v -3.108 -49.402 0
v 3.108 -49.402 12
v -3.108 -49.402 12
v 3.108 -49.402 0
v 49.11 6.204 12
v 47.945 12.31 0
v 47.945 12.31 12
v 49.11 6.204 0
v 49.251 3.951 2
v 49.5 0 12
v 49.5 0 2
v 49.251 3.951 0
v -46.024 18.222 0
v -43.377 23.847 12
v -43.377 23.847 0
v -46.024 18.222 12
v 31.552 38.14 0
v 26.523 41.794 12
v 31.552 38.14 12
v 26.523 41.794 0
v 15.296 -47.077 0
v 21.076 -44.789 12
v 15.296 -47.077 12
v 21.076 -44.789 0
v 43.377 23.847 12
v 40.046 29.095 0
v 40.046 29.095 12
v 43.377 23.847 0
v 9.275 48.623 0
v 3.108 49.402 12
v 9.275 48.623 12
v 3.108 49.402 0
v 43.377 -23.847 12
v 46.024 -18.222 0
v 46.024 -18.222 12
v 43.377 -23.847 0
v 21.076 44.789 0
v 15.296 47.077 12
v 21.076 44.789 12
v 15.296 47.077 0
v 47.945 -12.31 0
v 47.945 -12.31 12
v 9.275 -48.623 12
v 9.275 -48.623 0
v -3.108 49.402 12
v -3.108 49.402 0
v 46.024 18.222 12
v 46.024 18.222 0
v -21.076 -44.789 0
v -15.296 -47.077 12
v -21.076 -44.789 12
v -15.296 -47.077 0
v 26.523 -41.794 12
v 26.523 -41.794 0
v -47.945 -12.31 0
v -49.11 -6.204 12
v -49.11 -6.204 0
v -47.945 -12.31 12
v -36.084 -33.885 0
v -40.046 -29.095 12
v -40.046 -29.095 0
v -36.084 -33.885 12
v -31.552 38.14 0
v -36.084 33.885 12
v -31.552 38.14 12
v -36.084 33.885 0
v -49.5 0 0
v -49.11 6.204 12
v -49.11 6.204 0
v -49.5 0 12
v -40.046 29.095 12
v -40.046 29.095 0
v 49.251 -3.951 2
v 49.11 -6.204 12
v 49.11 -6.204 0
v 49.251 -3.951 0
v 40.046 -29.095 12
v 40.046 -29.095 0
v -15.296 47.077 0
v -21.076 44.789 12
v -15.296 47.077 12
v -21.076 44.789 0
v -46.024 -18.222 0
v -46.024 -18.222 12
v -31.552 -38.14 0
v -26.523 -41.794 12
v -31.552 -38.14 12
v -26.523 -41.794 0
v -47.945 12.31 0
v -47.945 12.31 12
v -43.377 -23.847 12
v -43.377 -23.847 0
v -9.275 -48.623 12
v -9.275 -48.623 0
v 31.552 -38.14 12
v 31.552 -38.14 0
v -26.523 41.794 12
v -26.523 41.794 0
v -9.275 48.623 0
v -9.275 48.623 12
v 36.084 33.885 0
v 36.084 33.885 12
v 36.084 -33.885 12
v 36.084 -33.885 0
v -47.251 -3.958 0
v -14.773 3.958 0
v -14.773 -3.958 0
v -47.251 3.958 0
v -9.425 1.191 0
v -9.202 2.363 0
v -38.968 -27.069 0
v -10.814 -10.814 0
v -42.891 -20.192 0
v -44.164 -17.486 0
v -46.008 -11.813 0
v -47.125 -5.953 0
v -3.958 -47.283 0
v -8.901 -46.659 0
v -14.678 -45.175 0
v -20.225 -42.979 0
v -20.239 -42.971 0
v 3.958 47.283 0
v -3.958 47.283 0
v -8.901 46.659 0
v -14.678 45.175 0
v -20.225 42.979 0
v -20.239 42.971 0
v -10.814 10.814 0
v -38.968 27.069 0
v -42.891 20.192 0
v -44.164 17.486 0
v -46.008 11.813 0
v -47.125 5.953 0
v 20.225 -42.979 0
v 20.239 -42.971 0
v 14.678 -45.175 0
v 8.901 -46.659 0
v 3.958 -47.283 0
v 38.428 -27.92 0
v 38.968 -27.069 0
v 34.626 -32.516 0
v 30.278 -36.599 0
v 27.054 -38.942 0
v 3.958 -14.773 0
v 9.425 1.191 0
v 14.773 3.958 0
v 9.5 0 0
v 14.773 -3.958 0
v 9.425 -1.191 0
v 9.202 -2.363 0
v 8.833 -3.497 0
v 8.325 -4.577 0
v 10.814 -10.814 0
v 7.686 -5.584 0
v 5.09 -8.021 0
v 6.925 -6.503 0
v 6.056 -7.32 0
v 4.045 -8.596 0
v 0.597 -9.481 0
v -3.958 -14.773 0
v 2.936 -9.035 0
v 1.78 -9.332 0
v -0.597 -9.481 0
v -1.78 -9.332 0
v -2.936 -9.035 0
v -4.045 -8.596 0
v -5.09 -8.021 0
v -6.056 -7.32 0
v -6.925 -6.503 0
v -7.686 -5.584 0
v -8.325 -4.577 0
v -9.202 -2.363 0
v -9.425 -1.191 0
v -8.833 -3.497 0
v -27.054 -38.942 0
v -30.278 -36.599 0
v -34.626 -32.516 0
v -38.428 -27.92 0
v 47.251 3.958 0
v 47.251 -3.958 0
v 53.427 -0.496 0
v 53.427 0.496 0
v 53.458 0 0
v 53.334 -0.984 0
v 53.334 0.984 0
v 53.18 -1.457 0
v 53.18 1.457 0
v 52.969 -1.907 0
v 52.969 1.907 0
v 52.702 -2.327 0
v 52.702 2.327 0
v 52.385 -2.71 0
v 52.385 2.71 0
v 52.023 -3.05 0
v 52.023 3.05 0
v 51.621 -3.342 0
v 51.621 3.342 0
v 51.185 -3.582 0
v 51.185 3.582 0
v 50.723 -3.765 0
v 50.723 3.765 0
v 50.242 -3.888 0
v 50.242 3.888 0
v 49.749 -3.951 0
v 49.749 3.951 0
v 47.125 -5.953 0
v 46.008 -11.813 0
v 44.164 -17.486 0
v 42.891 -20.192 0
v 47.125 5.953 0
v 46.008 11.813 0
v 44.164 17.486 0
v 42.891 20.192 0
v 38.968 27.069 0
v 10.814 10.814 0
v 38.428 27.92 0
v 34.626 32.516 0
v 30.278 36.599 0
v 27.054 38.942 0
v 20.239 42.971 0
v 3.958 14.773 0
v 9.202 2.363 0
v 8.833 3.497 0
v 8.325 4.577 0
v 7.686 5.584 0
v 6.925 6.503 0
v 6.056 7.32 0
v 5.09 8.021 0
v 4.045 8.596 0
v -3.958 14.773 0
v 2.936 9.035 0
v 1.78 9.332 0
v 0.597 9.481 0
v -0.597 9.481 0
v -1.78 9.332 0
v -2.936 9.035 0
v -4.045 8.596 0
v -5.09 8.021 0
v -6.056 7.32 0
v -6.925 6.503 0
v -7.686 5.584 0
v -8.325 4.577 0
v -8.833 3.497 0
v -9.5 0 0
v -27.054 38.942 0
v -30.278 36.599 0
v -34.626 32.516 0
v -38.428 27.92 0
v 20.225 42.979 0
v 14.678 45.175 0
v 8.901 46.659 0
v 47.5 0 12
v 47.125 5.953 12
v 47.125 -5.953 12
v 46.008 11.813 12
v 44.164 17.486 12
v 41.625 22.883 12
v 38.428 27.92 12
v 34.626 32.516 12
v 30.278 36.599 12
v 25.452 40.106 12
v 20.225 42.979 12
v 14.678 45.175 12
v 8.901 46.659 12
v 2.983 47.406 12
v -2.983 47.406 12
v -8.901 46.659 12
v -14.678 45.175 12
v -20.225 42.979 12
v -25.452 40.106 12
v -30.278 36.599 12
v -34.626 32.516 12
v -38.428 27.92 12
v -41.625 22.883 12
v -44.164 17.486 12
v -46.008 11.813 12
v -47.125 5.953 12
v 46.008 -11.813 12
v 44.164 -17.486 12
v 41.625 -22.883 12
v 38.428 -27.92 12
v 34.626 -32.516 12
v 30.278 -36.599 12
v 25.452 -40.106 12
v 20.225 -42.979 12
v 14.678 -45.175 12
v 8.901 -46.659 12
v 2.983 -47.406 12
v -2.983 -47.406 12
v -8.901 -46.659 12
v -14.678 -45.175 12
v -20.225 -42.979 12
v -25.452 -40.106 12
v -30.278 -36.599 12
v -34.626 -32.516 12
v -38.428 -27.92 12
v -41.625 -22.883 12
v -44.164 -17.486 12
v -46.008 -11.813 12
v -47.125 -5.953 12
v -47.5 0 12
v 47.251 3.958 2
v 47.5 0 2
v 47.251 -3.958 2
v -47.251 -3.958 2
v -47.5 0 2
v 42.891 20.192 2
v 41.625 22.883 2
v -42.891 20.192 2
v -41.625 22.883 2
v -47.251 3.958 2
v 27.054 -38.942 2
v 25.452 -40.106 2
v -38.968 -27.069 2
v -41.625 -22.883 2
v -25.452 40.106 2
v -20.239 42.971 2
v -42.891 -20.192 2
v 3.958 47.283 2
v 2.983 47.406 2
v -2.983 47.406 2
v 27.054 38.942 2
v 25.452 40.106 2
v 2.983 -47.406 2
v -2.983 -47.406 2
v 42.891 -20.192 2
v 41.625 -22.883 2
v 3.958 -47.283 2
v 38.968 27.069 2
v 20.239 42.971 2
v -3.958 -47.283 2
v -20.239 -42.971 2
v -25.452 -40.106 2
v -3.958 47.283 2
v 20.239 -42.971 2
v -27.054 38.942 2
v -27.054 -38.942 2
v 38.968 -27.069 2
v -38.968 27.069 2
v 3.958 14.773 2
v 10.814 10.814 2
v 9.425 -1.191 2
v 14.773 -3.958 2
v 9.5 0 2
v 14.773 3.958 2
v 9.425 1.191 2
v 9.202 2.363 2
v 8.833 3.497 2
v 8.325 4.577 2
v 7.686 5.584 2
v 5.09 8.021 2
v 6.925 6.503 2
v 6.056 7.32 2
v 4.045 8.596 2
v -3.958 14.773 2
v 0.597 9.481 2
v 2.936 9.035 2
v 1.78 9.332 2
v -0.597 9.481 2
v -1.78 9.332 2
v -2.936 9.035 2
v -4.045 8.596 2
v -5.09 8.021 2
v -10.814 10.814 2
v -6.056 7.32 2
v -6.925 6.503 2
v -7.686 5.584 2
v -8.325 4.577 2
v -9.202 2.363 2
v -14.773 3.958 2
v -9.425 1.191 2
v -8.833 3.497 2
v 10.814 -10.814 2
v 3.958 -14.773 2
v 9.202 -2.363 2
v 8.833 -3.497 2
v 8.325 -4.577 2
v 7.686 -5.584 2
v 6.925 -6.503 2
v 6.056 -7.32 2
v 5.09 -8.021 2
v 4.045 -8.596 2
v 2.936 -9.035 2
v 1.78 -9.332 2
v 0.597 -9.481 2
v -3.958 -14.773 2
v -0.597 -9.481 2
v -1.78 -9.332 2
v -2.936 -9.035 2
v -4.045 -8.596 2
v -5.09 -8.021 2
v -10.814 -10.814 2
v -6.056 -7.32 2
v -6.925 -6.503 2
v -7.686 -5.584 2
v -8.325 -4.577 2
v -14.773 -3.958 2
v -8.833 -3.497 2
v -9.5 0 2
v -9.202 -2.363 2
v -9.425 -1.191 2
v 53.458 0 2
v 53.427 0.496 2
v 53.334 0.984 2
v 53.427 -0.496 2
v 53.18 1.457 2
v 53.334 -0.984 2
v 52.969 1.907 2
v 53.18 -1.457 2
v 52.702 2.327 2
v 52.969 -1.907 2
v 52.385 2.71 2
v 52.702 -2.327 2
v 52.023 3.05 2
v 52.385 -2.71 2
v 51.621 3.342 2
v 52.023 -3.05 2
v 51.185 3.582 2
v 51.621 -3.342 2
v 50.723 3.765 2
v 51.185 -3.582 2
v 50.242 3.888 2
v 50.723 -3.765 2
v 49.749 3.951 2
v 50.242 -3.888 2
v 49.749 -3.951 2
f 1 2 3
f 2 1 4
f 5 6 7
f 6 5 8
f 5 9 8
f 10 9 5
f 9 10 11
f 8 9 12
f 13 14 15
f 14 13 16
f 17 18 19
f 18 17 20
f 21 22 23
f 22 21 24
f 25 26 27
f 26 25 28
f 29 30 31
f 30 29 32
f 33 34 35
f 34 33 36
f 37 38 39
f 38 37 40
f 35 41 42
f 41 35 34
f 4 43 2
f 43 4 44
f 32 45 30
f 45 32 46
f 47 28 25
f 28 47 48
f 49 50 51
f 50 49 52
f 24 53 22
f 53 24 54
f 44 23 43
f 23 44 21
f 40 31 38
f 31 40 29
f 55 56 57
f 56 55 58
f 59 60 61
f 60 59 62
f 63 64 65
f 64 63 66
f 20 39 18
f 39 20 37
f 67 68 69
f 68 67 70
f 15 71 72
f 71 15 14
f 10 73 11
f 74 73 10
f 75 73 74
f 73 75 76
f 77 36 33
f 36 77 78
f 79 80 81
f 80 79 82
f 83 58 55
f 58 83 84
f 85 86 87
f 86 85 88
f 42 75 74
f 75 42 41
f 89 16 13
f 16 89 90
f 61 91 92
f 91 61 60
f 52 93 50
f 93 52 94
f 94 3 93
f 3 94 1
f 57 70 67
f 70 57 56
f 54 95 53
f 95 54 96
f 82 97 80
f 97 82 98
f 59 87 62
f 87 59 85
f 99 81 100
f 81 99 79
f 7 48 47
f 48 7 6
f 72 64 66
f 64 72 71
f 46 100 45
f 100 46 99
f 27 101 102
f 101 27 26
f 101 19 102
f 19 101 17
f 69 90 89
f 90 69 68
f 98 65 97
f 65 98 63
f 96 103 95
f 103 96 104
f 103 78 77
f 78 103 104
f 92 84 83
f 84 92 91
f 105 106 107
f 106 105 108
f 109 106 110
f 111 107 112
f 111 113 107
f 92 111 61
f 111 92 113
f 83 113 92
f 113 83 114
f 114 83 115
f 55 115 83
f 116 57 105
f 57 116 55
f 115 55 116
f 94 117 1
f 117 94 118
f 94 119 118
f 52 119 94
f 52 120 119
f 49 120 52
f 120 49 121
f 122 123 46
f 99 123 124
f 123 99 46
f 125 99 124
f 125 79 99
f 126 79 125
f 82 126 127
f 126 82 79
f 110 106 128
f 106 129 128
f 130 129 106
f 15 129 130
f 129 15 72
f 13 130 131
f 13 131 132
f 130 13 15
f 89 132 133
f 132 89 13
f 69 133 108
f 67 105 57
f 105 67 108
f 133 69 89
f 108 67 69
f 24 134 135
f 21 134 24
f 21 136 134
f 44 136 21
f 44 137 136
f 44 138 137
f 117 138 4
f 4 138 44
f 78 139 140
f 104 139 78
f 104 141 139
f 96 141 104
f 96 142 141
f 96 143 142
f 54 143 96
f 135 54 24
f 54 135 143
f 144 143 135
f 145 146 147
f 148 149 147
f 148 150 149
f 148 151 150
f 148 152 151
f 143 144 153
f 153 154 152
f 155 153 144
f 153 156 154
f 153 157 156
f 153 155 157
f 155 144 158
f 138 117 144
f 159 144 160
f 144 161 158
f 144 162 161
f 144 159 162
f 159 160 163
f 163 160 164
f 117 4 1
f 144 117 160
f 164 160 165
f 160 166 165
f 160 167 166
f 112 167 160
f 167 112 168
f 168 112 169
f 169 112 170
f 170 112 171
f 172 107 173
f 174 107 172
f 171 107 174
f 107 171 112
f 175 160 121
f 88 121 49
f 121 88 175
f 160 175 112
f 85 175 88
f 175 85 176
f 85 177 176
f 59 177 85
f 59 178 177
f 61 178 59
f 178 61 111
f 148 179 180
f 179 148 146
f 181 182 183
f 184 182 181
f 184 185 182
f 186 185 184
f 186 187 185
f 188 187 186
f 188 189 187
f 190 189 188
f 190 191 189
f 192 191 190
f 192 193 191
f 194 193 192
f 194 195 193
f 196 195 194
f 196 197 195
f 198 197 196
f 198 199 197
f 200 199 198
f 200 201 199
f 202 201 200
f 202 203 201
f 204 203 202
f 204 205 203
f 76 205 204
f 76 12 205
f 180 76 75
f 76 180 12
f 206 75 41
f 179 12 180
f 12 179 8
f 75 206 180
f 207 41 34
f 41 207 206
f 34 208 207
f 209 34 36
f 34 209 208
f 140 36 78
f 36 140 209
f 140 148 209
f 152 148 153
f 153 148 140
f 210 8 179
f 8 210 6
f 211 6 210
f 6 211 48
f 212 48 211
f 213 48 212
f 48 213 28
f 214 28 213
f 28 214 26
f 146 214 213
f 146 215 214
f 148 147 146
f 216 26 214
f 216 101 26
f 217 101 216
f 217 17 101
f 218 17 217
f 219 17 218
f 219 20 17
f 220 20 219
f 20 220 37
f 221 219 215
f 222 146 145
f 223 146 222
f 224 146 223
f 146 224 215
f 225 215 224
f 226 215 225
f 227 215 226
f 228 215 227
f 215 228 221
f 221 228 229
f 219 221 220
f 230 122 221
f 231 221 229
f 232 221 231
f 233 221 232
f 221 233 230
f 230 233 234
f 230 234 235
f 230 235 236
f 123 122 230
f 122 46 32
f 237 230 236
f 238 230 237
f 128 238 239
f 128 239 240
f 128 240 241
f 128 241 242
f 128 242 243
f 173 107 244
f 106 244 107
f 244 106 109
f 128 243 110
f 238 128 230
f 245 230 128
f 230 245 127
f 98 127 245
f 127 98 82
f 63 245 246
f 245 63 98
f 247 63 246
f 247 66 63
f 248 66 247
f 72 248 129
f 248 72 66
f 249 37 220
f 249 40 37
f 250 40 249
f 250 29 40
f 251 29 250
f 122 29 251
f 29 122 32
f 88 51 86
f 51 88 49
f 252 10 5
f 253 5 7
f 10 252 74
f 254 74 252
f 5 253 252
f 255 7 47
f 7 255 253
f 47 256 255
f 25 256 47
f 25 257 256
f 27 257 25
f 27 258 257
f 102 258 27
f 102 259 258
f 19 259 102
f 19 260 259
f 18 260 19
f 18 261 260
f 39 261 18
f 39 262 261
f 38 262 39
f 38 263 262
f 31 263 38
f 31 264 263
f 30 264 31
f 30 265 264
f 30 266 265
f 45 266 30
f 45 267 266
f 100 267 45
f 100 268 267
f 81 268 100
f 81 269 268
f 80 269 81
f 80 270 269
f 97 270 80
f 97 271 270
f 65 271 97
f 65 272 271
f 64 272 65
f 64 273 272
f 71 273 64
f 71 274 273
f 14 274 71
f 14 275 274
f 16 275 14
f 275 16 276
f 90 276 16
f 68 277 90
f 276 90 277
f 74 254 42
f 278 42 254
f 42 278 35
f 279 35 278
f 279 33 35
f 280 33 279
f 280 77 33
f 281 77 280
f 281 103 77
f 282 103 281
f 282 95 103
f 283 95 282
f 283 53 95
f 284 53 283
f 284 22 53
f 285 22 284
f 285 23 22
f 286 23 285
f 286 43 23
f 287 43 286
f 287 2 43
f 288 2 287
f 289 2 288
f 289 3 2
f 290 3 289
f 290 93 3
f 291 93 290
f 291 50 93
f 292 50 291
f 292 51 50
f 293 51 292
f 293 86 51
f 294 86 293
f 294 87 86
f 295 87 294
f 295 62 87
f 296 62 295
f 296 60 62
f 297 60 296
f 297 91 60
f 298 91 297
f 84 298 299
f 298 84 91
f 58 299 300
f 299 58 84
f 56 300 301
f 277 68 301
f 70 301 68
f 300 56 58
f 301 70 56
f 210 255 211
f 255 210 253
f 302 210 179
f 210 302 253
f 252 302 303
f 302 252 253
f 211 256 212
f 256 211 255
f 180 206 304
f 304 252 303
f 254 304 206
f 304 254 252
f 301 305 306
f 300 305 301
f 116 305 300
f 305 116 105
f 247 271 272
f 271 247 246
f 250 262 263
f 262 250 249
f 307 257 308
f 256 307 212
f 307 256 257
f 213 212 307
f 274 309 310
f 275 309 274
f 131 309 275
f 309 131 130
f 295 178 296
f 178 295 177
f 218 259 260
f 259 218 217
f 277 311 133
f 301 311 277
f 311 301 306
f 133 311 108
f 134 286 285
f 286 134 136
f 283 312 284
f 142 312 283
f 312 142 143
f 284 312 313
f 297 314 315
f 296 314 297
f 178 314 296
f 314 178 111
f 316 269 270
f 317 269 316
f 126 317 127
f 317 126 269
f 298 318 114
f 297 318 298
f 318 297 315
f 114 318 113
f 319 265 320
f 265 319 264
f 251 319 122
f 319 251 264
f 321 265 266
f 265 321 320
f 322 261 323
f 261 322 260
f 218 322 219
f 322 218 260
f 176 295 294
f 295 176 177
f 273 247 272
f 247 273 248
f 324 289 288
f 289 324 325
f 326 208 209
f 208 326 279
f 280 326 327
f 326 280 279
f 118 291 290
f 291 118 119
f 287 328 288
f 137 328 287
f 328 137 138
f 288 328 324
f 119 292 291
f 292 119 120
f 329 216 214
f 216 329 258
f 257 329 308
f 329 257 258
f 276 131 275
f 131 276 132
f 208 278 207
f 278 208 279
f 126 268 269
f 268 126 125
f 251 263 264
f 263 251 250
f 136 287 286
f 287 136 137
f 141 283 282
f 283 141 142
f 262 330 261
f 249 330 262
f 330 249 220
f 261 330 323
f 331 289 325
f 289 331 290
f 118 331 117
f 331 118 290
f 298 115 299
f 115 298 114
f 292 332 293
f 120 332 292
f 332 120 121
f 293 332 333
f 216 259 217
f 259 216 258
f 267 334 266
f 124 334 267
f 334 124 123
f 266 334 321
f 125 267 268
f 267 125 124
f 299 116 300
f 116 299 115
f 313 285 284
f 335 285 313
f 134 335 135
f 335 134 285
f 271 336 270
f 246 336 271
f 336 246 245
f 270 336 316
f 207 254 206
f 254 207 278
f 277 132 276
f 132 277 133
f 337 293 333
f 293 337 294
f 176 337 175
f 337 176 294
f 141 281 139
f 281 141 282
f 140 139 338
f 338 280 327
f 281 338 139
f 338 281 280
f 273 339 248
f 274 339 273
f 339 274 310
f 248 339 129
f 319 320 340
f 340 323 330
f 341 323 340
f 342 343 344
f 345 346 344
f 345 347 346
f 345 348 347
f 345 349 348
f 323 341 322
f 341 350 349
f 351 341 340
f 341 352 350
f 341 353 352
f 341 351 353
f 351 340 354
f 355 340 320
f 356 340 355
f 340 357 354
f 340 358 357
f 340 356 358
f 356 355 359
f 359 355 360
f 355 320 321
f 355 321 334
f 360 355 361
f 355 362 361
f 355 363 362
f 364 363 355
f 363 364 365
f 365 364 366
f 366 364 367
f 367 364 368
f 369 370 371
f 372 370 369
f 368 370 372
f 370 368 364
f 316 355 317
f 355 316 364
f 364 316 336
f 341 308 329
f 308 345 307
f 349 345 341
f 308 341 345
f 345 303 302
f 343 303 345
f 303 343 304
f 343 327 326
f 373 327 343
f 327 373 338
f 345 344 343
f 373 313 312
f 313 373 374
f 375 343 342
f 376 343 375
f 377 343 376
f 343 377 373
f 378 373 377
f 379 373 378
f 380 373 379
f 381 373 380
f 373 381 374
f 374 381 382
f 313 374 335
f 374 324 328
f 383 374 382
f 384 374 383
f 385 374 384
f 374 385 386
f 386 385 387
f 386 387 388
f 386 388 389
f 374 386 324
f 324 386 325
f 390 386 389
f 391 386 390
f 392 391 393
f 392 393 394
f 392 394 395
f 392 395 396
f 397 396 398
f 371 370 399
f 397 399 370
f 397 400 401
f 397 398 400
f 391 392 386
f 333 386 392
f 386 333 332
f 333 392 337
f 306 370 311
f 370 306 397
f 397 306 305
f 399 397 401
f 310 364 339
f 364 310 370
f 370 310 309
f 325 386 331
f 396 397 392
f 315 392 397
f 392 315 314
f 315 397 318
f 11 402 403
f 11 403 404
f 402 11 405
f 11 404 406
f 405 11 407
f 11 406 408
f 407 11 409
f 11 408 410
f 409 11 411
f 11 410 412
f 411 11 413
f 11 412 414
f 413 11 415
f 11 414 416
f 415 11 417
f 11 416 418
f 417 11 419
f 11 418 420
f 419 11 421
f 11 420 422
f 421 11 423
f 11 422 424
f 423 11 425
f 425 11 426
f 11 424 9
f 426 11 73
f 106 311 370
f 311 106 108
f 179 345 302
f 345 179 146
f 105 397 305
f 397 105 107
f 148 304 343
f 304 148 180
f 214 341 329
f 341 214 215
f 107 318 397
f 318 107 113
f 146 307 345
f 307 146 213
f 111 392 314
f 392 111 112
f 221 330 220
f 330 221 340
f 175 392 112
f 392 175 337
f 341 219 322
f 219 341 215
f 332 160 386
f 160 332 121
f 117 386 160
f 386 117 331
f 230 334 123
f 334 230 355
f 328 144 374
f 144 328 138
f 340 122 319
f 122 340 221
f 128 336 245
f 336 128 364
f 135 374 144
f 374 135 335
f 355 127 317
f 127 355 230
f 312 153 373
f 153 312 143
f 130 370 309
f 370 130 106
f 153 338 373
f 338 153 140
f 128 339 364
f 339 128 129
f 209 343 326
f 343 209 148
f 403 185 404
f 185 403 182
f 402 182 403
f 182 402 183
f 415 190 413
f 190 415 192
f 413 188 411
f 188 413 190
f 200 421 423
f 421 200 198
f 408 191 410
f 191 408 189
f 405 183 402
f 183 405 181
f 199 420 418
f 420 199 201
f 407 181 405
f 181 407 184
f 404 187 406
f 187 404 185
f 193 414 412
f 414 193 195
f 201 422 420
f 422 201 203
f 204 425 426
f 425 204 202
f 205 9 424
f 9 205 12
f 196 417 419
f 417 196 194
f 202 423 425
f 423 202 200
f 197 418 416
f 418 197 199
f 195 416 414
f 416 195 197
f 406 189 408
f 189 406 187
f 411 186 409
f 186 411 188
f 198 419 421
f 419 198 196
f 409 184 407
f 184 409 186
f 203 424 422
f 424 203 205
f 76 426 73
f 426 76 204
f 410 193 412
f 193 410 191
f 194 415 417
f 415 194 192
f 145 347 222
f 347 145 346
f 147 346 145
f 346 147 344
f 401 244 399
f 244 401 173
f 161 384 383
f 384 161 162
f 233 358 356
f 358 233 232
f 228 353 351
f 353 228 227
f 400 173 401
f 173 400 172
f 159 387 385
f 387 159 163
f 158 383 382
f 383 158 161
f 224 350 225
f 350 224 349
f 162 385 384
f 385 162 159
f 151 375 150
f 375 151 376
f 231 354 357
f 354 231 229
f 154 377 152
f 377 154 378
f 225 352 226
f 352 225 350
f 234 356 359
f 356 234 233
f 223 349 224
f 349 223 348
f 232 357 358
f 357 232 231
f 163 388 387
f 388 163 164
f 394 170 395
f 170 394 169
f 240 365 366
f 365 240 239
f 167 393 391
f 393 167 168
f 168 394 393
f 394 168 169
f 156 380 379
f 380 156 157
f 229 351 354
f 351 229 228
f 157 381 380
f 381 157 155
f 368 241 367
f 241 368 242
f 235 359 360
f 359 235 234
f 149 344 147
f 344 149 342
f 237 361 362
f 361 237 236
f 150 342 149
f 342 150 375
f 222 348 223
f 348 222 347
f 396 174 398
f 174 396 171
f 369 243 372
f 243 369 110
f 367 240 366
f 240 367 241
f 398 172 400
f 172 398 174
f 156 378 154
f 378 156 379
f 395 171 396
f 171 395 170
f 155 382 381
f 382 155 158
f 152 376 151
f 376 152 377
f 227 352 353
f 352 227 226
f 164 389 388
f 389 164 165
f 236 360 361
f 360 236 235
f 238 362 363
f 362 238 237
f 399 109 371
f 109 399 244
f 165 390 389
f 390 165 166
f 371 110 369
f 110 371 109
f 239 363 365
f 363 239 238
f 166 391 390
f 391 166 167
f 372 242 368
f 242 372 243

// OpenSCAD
r=47.5; //radius
rays=6; //number of rays
t=2; //material tickness
h=10; // neck border height
holeR=r/5; 
$fn=50;



d=2*r;  //diameter
l=d/(2*rays);
module rays(){
    translate([0,0,t/2])  

        for(i=[0:2*rays])
        {


            rotate([0,0,i*(360/(2*rays))])    
                cube([2*t+d,l,t],true);


        }
}

module oCylinder()
{
    cylinder (h+t,r+t,r+t,true);
}

module iCylinder()
{
    cylinder (h+t,r,r,true);
}
module cCylinder()
{
    cylinder (h+t,r+5*t,r+5*t,true);
}
module main()
{
    union()
    {
        translate([0,0,((h+t)/2)])
            difference()
            {
                oCylinder();
                iCylinder();
            }

        union()
        {      
            difference()
            {
                rays();
                difference()
                {
                    cCylinder();
                    iCylinder();
                }
            }
            translate([r+t,0,t/2])
                cylinder(t,l/2,l/2,true);
        }

    }
}
difference()
{
    main();
    translate([0,0,t/2])
        cylinder(t,holeR,holeR,true);
}
